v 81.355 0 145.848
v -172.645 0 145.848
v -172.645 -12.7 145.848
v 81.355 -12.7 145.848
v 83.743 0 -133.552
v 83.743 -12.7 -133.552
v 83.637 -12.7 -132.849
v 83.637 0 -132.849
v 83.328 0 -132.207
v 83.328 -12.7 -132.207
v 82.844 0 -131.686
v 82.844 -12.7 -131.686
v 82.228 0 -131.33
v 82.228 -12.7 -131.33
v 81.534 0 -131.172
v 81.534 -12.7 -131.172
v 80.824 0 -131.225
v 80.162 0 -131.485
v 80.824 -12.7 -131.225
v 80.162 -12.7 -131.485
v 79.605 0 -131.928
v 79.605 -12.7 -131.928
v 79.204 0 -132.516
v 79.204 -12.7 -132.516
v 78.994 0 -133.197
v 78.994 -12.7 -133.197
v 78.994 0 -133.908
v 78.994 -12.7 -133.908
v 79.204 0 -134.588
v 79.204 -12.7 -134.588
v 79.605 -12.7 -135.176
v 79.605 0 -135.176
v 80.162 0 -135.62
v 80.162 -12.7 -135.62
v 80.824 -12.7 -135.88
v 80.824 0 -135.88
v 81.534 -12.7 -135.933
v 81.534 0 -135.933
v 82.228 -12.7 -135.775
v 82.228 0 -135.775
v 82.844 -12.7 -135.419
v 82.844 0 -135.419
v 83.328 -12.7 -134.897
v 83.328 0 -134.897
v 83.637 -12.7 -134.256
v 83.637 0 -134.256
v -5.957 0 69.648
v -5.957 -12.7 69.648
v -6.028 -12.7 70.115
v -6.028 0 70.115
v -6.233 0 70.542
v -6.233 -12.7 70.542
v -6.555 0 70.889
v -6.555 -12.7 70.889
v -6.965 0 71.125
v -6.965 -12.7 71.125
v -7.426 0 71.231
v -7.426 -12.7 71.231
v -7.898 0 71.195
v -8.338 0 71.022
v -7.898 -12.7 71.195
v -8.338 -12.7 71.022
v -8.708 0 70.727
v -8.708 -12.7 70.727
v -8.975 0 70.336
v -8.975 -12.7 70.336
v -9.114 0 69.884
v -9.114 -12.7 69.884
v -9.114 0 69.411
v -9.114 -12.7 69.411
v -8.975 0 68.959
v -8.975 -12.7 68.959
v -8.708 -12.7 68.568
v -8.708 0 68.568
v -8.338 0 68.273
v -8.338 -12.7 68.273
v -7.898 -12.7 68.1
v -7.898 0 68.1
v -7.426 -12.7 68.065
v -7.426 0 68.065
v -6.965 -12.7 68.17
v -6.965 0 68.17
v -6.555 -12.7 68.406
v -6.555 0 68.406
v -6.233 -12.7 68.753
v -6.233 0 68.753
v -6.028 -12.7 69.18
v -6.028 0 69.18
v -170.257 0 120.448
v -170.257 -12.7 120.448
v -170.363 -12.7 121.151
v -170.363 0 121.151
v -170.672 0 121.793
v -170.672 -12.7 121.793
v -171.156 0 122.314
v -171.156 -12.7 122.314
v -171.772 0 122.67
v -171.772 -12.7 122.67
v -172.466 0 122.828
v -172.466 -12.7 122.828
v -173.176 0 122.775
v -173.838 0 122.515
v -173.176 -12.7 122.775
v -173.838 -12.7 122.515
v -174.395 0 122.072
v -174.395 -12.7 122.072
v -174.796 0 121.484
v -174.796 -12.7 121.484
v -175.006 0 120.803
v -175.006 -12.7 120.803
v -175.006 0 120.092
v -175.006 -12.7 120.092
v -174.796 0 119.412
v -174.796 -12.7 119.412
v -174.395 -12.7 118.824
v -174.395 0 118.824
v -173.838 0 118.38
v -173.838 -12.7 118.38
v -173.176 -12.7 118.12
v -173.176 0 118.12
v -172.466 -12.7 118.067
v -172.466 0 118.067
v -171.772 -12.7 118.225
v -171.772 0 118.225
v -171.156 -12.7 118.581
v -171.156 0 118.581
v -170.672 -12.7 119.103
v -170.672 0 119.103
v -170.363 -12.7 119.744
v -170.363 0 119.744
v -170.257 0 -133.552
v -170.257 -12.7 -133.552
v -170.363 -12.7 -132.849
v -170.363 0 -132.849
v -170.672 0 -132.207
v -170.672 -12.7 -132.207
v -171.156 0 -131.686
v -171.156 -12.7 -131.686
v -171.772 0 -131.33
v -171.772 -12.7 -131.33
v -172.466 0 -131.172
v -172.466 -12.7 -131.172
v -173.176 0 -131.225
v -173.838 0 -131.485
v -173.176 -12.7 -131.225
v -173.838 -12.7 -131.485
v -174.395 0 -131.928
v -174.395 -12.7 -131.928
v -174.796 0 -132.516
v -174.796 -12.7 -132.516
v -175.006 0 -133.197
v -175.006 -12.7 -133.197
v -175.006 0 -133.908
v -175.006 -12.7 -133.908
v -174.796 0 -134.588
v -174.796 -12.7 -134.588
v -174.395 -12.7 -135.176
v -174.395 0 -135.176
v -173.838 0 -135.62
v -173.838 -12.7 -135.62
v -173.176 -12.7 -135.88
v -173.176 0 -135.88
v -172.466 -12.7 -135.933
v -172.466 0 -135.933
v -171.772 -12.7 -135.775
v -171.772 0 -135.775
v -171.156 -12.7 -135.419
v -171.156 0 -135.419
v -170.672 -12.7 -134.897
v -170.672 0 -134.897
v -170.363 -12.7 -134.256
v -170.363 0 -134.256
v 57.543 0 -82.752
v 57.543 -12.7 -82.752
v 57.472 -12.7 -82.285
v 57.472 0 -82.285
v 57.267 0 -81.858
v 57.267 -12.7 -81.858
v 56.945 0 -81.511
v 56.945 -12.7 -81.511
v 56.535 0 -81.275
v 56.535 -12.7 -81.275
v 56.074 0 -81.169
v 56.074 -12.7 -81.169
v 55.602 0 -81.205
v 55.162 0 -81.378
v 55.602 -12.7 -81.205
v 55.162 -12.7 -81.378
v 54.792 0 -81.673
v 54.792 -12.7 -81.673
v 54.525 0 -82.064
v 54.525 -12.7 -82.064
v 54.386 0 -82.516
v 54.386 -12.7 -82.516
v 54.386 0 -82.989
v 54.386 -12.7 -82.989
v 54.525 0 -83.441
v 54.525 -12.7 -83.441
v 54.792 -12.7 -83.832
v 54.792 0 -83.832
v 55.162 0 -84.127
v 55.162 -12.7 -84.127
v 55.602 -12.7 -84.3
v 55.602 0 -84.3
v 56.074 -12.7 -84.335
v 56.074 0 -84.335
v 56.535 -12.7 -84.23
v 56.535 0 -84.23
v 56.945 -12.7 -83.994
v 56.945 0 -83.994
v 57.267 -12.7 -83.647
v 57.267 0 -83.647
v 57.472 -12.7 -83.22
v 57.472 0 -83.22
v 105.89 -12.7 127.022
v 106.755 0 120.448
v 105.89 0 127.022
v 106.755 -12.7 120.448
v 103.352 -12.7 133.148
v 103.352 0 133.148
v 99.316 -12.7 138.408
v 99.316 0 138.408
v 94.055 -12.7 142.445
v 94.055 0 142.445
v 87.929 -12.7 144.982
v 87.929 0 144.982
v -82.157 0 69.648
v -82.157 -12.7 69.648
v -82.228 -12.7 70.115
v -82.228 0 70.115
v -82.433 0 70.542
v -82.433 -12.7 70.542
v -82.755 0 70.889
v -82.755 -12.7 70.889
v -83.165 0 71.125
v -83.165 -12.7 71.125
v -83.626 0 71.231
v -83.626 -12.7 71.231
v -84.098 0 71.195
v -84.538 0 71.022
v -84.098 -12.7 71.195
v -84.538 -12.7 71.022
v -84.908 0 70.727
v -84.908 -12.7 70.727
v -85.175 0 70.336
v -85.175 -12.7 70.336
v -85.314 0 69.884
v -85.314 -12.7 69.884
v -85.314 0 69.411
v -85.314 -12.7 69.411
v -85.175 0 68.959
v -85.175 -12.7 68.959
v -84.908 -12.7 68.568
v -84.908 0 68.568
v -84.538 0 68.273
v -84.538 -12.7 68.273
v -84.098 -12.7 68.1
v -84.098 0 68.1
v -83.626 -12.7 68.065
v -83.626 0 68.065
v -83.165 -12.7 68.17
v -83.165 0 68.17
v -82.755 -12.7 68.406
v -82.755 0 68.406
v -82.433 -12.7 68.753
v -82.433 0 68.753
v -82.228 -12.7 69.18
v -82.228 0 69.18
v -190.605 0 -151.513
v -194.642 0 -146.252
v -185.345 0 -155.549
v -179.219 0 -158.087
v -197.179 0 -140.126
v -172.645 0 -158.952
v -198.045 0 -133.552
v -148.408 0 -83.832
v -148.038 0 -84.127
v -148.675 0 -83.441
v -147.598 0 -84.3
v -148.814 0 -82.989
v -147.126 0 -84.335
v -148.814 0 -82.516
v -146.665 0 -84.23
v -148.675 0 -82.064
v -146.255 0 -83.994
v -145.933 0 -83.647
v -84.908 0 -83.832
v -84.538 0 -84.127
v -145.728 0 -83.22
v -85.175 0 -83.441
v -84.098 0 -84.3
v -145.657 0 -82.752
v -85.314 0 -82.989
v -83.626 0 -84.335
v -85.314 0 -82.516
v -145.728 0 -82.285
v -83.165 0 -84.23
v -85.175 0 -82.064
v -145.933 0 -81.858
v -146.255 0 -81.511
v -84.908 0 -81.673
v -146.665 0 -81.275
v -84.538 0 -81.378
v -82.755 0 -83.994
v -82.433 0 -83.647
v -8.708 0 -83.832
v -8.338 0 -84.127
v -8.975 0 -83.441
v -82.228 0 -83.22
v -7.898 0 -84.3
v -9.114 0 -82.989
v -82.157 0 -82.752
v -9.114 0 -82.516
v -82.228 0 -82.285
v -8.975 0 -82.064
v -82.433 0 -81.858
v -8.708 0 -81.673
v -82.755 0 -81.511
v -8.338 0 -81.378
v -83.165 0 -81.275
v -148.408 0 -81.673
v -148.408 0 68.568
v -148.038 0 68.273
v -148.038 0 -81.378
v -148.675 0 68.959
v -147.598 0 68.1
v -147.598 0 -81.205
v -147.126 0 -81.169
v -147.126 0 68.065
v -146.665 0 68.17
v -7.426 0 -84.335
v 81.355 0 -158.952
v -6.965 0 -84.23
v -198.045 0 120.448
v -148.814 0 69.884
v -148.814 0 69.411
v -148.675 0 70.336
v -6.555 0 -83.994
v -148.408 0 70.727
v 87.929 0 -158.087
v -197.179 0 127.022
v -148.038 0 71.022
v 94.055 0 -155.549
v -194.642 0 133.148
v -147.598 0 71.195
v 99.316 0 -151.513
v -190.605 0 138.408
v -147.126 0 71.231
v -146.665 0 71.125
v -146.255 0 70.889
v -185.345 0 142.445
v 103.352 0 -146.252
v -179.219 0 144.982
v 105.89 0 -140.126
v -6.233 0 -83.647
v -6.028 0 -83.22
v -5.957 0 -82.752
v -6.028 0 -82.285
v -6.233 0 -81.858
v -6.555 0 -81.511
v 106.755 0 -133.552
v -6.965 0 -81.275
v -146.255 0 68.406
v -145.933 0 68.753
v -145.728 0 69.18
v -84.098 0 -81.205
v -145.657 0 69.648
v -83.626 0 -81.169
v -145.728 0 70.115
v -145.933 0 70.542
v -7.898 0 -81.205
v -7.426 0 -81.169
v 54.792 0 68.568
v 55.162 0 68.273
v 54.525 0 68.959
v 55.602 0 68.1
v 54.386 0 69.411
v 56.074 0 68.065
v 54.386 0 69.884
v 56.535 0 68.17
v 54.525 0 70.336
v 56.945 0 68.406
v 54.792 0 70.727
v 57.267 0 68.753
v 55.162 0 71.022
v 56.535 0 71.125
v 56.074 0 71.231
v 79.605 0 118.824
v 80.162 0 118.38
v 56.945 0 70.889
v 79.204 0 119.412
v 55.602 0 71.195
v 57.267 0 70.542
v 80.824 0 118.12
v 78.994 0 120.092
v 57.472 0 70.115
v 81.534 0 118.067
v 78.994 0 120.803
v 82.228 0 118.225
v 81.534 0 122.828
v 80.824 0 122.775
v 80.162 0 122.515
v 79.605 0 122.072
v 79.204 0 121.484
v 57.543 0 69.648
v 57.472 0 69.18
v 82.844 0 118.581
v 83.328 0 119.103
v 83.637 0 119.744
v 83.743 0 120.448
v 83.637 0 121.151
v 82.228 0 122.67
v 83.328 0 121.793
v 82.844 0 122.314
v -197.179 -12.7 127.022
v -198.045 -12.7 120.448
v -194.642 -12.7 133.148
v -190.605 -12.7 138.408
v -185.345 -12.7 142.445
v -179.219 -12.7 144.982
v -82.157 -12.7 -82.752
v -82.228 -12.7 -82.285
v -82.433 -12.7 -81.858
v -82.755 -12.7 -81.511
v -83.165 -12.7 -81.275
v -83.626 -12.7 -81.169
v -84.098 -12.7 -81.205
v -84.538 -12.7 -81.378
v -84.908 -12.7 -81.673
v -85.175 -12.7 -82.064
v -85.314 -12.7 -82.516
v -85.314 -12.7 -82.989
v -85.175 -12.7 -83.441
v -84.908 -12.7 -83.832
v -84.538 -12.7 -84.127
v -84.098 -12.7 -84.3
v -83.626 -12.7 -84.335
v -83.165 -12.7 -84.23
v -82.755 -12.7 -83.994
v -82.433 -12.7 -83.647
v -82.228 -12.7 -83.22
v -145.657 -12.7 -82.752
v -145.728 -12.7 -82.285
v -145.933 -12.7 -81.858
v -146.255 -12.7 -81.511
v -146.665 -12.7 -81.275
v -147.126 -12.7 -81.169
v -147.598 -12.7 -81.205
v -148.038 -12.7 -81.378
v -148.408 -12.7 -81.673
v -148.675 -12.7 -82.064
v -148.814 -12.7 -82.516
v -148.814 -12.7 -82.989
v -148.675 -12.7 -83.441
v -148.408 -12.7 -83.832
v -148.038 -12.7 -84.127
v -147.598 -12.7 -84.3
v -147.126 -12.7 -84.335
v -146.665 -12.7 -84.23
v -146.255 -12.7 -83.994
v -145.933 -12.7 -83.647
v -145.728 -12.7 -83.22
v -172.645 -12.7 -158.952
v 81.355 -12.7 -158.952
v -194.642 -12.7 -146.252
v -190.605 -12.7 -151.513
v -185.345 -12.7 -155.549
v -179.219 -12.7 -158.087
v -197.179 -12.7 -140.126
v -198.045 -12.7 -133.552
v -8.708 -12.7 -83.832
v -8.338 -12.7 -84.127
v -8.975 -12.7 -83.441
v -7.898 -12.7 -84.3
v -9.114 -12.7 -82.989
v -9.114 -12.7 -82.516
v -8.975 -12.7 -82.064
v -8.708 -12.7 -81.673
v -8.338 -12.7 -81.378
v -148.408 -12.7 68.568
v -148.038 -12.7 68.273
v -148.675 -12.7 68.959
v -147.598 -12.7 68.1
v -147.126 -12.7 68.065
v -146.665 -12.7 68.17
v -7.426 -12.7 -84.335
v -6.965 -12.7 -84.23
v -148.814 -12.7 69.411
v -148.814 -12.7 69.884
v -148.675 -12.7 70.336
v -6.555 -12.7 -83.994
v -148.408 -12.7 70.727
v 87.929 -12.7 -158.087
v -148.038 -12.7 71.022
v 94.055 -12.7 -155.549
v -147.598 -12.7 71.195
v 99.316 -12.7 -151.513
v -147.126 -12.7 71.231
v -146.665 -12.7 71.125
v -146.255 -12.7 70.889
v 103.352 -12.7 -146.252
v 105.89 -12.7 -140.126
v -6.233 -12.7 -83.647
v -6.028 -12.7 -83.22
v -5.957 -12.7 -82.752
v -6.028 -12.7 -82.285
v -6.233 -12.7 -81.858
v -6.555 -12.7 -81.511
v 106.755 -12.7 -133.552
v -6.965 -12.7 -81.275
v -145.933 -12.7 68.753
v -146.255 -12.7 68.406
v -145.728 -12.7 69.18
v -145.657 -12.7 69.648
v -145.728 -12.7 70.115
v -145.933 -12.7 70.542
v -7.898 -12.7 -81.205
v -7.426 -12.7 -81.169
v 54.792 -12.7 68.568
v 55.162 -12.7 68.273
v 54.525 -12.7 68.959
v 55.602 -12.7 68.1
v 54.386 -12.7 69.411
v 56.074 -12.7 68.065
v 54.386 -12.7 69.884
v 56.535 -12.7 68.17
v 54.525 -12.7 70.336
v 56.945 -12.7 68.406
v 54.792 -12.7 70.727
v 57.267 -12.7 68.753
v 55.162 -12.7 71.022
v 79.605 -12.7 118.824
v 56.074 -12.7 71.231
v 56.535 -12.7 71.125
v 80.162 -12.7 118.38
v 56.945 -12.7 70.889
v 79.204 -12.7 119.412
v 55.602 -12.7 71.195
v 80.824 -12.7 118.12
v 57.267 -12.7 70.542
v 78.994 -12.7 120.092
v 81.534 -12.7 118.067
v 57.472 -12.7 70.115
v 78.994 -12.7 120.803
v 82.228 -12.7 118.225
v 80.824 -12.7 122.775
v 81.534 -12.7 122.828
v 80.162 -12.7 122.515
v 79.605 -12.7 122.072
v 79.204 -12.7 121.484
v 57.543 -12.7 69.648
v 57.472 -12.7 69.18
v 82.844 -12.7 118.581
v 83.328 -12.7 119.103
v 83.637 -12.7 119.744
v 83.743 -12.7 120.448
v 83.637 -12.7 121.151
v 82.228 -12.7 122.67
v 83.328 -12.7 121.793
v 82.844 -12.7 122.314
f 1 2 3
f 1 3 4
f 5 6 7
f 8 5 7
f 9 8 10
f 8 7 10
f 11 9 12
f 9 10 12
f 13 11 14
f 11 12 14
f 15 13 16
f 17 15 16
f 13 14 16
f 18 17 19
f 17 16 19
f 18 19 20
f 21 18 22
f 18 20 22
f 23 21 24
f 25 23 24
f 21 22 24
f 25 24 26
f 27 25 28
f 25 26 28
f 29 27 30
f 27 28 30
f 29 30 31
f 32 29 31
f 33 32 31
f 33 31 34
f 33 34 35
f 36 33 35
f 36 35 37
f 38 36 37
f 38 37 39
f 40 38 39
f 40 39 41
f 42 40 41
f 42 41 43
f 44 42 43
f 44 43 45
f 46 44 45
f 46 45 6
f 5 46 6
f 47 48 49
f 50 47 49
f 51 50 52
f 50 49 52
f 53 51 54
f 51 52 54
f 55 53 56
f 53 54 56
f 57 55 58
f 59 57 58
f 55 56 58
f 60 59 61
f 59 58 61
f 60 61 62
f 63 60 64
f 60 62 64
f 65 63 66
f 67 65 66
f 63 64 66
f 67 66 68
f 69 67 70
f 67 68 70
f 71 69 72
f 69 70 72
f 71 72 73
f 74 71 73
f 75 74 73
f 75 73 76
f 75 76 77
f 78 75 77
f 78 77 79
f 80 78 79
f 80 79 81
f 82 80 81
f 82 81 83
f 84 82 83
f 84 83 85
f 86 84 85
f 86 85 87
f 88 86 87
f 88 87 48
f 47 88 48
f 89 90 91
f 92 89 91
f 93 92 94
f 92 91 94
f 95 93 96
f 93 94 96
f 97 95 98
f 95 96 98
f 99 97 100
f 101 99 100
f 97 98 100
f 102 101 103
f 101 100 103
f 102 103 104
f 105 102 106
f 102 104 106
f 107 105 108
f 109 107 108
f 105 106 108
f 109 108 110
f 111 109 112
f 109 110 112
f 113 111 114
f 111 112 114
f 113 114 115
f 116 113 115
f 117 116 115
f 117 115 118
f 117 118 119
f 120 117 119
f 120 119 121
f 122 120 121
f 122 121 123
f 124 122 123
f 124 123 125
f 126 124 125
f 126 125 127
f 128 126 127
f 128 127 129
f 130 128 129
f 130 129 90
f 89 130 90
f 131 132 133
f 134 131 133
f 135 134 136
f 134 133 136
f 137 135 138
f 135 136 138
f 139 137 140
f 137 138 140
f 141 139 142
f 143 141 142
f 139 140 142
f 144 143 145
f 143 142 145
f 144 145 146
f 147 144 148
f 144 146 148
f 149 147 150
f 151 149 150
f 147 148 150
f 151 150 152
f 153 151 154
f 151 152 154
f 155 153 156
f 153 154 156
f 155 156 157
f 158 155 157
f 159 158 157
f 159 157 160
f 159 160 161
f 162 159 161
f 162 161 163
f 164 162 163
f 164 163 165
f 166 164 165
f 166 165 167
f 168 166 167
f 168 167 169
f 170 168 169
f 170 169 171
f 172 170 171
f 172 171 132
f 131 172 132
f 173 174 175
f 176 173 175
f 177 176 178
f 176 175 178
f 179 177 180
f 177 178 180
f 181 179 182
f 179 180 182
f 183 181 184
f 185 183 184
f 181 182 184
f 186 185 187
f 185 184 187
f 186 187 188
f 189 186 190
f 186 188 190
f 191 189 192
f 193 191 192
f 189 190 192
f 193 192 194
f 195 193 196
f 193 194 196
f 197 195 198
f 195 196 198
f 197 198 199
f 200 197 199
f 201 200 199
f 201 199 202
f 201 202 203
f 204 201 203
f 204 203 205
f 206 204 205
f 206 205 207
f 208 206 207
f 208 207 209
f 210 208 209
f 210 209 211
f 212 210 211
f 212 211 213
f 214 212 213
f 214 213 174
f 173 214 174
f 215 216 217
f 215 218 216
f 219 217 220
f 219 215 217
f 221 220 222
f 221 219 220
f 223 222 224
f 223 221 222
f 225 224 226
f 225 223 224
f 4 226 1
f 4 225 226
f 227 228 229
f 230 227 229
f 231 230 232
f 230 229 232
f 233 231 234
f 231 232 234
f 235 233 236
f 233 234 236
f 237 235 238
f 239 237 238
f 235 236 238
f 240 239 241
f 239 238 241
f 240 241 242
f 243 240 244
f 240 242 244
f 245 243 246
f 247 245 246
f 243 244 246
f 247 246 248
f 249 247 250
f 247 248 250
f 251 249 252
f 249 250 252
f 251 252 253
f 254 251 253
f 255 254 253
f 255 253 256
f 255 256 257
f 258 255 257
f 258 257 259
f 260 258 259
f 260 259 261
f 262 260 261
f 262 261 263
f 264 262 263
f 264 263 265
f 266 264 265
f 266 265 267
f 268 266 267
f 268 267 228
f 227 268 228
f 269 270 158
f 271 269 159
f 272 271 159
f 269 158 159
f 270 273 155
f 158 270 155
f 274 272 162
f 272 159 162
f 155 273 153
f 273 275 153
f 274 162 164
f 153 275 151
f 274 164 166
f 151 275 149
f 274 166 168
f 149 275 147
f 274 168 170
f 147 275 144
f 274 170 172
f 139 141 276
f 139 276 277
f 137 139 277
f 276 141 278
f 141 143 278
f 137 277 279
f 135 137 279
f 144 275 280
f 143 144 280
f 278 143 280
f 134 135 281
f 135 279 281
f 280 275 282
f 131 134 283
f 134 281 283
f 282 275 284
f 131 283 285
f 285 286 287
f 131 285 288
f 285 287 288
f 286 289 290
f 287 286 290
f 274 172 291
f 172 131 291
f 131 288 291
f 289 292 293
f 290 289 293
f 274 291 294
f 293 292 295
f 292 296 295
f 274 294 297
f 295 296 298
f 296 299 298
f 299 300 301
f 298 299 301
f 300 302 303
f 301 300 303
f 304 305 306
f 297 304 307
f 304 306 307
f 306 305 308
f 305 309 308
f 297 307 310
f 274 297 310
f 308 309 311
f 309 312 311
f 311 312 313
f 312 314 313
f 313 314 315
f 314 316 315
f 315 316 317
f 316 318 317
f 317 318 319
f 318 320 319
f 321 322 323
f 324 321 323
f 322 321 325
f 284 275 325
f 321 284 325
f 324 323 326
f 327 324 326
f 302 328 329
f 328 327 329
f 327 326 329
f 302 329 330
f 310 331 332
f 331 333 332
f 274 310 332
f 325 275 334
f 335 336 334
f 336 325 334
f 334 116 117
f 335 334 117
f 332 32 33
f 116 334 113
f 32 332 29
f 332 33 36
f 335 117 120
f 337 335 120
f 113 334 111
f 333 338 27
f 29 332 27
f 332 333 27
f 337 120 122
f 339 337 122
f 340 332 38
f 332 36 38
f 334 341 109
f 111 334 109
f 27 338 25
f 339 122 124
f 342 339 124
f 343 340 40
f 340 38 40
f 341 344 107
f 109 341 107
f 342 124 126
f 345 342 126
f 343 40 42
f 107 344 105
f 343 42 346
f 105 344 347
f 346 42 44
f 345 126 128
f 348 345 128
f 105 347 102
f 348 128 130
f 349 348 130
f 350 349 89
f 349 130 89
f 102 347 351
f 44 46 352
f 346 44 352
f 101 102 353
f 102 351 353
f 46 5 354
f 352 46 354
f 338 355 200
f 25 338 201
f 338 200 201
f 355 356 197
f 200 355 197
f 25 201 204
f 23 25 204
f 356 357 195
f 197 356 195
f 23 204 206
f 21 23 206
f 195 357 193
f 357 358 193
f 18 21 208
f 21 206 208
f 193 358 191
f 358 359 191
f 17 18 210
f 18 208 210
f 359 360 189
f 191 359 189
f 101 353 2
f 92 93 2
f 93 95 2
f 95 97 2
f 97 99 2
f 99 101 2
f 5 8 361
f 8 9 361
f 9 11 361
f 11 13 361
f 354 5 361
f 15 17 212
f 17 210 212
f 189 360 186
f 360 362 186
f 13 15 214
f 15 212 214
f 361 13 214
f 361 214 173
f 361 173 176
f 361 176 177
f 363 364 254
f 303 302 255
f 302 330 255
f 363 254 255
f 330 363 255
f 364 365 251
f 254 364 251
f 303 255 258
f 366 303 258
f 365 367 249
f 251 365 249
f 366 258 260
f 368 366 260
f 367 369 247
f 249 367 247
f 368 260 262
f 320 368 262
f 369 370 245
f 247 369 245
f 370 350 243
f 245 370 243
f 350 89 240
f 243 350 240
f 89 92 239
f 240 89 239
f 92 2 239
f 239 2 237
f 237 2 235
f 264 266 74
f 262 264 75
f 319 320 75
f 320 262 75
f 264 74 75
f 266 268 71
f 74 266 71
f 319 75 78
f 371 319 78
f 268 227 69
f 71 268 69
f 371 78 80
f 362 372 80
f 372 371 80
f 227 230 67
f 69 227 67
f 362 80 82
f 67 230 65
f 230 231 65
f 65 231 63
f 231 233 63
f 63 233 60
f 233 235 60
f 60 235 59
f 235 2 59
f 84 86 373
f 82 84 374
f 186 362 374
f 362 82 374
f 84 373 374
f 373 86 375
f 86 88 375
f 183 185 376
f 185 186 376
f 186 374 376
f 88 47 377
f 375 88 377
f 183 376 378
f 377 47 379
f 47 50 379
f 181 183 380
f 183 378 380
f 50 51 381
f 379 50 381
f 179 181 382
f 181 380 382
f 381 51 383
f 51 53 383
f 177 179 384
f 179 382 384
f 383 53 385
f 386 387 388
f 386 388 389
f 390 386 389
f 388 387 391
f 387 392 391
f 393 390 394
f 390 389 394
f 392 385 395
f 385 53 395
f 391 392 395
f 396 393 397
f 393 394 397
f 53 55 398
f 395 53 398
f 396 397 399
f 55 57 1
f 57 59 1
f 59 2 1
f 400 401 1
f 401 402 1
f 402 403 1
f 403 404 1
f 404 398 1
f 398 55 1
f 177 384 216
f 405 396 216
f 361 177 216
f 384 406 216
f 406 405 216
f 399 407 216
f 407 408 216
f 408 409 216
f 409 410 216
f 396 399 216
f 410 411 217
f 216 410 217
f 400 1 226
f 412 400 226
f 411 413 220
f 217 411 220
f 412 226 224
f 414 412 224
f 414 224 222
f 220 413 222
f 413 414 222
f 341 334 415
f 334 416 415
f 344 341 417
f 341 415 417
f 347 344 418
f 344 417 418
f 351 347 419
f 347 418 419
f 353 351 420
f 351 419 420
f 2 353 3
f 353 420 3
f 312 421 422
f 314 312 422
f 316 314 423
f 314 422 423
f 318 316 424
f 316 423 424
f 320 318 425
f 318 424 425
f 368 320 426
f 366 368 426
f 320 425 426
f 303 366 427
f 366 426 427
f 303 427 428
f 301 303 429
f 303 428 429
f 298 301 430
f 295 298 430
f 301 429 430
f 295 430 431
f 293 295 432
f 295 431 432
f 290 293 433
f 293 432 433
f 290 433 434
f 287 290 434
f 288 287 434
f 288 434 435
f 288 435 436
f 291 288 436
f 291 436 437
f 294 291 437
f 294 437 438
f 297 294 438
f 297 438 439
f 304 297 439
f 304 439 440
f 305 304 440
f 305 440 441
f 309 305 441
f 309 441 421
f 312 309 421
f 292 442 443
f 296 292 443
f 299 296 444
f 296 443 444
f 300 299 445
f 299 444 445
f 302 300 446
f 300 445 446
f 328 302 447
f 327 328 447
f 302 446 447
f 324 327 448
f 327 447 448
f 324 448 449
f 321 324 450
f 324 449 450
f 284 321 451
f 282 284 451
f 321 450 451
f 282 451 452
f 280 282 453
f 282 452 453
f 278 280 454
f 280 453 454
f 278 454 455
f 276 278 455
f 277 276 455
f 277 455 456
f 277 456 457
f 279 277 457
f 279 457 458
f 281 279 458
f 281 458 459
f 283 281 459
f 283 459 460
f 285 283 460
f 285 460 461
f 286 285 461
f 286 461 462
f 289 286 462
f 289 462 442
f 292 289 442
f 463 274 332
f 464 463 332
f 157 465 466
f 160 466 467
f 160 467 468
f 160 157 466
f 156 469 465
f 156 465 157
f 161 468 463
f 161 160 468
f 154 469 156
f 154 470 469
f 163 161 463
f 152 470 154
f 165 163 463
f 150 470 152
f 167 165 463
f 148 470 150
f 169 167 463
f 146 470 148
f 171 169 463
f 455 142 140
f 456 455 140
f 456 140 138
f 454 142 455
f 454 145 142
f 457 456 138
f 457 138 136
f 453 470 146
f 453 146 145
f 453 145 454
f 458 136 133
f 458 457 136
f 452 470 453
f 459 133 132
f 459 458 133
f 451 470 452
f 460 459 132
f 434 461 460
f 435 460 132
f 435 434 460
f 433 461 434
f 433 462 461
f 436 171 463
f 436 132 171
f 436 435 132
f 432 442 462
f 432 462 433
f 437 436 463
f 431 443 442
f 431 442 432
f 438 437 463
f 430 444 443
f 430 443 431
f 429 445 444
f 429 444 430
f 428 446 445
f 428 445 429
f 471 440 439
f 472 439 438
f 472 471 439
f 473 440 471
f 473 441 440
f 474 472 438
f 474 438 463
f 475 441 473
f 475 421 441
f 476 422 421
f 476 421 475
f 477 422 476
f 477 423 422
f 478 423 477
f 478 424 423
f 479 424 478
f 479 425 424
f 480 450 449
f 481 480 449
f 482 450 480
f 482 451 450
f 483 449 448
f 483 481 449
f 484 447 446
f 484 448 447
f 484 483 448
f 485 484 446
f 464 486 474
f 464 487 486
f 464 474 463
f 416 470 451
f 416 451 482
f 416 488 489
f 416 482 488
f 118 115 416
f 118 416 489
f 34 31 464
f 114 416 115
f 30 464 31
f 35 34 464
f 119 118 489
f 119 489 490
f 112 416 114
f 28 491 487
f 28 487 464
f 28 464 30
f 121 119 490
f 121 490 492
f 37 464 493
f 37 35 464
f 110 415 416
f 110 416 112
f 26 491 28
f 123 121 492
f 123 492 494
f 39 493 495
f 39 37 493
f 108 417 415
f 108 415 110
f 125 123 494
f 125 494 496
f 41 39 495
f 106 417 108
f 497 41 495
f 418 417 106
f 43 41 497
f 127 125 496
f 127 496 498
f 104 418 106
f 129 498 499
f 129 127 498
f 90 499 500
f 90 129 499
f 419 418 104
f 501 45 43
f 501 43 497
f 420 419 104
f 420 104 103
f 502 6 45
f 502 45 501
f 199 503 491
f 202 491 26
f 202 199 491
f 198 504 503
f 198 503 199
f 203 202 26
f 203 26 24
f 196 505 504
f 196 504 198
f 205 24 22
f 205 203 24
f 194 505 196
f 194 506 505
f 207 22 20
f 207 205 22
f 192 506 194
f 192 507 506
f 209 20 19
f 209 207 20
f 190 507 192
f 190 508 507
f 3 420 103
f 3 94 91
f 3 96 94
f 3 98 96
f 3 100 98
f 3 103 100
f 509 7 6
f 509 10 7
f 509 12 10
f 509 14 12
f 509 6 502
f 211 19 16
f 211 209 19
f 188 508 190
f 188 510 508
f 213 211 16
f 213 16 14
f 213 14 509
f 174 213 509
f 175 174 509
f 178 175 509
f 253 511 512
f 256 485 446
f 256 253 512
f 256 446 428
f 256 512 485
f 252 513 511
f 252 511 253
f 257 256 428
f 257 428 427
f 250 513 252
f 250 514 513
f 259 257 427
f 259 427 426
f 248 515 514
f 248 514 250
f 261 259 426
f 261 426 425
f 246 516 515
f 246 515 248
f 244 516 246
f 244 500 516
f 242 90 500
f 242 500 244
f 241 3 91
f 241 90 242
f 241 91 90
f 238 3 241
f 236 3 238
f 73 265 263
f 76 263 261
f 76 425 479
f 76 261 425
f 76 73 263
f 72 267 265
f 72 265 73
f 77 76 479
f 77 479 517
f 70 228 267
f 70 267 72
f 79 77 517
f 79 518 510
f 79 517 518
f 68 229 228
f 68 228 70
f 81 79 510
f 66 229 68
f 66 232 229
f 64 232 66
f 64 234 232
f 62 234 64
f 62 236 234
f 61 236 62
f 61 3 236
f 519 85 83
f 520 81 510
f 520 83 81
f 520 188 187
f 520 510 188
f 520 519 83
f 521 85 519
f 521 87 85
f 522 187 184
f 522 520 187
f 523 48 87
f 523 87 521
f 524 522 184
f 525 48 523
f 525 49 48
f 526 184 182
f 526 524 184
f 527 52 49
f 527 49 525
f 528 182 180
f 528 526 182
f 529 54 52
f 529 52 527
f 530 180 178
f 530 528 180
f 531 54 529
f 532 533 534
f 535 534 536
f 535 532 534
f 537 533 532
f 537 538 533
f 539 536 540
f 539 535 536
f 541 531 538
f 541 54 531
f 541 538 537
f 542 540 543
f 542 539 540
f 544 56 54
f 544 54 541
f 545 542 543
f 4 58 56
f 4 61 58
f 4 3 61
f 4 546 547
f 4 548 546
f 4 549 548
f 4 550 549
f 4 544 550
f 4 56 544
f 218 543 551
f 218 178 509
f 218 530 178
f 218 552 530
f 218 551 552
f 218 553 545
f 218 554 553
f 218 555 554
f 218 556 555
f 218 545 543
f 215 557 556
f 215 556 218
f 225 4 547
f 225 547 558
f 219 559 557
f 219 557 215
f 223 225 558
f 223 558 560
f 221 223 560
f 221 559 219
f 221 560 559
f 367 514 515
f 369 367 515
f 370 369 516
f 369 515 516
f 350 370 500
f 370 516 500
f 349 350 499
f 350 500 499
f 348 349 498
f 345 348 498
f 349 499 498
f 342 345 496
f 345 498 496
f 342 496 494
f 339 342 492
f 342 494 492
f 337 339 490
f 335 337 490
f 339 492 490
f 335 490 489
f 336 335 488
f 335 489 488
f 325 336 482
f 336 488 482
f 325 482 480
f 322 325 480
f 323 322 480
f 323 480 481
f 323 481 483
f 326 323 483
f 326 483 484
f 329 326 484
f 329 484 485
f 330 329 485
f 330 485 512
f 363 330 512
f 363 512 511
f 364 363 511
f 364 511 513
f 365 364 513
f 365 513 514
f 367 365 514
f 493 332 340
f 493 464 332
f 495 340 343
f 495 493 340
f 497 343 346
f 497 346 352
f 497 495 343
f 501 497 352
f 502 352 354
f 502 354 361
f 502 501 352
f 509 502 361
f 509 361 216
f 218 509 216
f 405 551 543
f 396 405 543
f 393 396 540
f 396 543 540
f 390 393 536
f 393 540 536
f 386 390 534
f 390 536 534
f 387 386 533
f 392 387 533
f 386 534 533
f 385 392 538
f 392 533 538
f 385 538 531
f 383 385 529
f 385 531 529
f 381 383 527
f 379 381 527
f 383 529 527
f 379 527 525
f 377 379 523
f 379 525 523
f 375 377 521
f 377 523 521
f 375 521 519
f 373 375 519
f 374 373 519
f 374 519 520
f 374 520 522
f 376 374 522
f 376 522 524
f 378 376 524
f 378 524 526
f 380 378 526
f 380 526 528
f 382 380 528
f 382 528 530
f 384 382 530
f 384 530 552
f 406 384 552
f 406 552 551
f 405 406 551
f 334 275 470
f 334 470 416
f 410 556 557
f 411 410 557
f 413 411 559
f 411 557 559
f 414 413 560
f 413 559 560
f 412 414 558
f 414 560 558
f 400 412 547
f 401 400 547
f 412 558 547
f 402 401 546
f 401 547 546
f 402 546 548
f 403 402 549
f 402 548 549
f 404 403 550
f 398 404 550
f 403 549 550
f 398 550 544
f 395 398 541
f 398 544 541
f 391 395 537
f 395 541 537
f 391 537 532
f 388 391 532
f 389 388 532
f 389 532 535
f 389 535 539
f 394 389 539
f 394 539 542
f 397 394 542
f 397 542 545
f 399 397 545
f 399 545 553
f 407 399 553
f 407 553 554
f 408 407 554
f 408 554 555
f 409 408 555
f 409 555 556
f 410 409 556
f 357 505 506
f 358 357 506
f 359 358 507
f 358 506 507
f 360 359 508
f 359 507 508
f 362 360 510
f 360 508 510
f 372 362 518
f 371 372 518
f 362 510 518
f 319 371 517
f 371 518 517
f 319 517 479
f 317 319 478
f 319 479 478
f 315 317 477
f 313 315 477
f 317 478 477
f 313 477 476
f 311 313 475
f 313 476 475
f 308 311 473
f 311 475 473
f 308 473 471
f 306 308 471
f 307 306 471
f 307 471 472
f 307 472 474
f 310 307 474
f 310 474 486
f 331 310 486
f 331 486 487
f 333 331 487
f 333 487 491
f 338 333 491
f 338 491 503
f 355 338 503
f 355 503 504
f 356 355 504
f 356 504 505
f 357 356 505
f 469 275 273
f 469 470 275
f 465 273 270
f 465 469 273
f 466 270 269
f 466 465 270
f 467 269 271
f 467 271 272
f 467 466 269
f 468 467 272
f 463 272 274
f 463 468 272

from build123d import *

# Parameters (mm, degrees)
F0_W     = 304.8
F0_H     = 304.8
F1_DEPTH = 12.7
F2_R     = 25.4
F3_R     = 2.3876
F4_DEPTH = 12.701
F5_R     = 1.5875
F6_DEPTH = 12.701


with BuildPart() as f1:
    # F0 (on Front) → F1 (new body)
    with BuildSketch(Plane.XZ):
        with Locations((-45.644617, -6.552428)):
            Rectangle(F0_W, F0_H)
    extrude(amount=F1_DEPTH)

    # F2
    f2_edges = [f1.edges().sort_by_distance(p)[0] for p in [
        (-198.044617, -6.35, 145.847572),
        (106.755383, -6.35, 145.847572),
        (-198.044617, -6.35, -158.952428),
        (106.755383, -6.35, -158.952428),
    ]]
    fillet(f2_edges, radius=F2_R)

    # F3 (on face) → F4 (cut, through all)
    with BuildSketch(Plane.XZ.offset(12.7)):
        with Locations((-172.644617, -133.552428)):
            Circle(F3_R)
        with Locations((81.355383, -133.552428)):
            Circle(F3_R)
        with Locations((81.355383, 120.447572)):
            Circle(F3_R)
        with Locations((-172.644617, 120.447572)):
            Circle(F3_R)
    extrude(amount=-F4_DEPTH, mode=Mode.SUBTRACT)

    # F5 (on face) → F6 (cut, through all)
    with BuildSketch(Plane.XZ.offset(12.7)):
        with Locations((-147.244617, 69.647572)):
            Circle(F5_R)
        with Locations((-83.744617, 69.647572)):
            Circle(F5_R)
        with Locations((-7.544617, 69.647572)):
            Circle(F5_R)
        with Locations((55.955383, 69.647572)):
            Circle(F5_R)
        with Locations((-147.244617, -82.752428)):
            Circle(F5_R)
        with Locations((-83.744617, -82.752428)):
            Circle(F5_R)
        with Locations((-7.544617, -82.752428)):
            Circle(F5_R)
        with Locations((55.955383, -82.752428)):
            Circle(F5_R)
    extrude(amount=-F6_DEPTH, mode=Mode.SUBTRACT)


solid = f1.part
